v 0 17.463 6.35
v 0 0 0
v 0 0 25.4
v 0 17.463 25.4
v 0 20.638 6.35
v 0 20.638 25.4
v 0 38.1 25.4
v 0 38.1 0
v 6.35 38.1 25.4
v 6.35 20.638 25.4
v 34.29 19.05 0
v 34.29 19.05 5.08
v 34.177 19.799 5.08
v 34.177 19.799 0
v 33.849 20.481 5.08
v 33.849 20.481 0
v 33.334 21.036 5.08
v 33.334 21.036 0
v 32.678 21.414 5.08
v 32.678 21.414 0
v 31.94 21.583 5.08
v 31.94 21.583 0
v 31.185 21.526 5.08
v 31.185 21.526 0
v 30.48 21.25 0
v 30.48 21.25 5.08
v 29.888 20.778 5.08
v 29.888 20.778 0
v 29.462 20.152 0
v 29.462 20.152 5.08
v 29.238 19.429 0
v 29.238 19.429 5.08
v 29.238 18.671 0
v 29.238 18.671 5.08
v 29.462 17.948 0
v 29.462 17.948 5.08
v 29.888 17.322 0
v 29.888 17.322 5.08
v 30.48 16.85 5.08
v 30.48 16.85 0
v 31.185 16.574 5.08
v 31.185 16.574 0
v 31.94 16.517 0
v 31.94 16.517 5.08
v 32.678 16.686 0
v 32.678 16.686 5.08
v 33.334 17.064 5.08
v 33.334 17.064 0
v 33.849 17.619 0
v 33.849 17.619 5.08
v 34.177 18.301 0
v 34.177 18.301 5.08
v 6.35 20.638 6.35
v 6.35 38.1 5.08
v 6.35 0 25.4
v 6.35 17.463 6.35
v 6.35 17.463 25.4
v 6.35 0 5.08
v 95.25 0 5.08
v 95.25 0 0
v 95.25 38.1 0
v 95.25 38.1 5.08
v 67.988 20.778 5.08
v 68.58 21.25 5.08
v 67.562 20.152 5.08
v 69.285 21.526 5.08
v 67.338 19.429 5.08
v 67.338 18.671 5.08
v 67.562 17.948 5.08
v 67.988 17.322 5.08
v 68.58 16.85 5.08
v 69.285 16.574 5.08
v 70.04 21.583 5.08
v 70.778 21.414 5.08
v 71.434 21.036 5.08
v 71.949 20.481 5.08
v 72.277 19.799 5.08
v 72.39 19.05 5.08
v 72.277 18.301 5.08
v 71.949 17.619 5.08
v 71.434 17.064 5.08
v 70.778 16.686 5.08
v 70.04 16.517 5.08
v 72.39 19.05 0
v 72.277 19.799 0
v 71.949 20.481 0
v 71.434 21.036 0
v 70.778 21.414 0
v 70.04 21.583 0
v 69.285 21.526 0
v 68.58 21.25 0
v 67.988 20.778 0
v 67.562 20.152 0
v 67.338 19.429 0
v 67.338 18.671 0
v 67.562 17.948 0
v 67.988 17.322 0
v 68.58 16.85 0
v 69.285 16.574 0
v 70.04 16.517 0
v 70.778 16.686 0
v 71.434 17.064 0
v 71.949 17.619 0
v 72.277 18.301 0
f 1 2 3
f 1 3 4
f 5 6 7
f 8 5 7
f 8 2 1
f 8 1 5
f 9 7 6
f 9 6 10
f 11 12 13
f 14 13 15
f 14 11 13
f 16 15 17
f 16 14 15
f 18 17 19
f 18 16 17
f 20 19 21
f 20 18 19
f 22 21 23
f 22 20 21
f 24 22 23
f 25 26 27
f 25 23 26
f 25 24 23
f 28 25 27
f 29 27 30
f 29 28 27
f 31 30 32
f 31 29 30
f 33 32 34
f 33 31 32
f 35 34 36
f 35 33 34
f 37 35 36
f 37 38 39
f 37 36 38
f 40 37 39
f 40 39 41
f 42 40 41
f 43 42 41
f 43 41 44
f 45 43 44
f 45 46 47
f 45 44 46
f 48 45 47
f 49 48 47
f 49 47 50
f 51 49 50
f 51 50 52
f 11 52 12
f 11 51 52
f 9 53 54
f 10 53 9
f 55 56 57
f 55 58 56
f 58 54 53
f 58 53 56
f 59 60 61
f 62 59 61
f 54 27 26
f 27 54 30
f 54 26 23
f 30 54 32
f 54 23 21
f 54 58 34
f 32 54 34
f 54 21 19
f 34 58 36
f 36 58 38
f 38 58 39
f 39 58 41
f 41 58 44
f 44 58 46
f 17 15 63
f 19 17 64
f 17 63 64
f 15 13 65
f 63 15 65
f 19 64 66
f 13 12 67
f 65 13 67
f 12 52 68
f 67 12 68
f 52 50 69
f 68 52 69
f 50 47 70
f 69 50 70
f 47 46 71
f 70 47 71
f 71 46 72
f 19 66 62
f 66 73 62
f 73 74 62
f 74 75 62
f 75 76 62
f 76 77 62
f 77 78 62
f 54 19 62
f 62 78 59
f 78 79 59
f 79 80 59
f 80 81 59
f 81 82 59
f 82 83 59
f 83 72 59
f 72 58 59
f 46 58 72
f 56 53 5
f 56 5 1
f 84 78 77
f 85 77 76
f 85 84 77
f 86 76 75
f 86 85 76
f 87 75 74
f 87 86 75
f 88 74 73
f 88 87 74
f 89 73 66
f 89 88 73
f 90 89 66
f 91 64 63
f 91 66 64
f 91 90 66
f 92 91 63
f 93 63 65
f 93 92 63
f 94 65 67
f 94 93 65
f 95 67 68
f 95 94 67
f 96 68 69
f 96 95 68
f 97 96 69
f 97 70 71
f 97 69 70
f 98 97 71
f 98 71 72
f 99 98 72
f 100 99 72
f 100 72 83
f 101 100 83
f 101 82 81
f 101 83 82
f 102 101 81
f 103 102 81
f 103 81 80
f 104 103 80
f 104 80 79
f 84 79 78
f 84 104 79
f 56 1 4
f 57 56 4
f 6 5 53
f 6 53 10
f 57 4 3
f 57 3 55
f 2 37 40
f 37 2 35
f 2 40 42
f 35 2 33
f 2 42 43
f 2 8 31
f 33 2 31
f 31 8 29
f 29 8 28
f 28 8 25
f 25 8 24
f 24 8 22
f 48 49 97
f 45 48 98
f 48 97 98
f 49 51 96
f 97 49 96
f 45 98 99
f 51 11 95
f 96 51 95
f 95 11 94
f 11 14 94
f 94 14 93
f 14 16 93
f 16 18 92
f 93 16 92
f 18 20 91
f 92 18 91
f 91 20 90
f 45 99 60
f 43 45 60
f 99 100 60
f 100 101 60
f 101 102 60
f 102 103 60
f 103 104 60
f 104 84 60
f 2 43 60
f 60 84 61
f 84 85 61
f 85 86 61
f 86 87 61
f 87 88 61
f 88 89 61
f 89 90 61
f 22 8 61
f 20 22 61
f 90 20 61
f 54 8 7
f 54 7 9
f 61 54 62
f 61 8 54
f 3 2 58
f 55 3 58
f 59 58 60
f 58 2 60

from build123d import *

# Parameters (mm, degrees)
F0_W     = 95.25
F0_H     = 38.1
F0_R     = 2.54
F1_DEPTH = 25.4
F2_W     = 88.9
F2_H     = 20.32
F3_DEPTH = 38.101
F4_W     = 3.175
F4_H     = 19.05
F5_DEPTH = 25.4


with BuildPart() as f1:
    # F0 (on Top) → F1 (new body)
    with BuildSketch(Plane.XY):
        with Locations((47.625, 19.05)):
            Rectangle(F0_W, F0_H)
        with Locations((31.75, 19.05)):
            Circle(F0_R, mode=Mode.SUBTRACT)
        with Locations((69.85, 19.05)):
            Circle(F0_R, mode=Mode.SUBTRACT)
    extrude(amount=F1_DEPTH)

    # F2 (on face) → F3 (cut, through all)
    with BuildSketch(Plane.XZ):
        with Locations((50.8, 15.24)):
            Rectangle(F2_W, F2_H)
    extrude(amount=-F3_DEPTH, mode=Mode.SUBTRACT)

    # F4 (on face) → F5 (cut)
    with BuildSketch(Plane(origin=(0, 0, 0), x_dir=(0, -1, 0), z_dir=(-1, 0, 0))):
        with Locations((-19.05, 15.875)):
            Rectangle(F4_W, F4_H)
    extrude(amount=-F5_DEPTH, mode=Mode.SUBTRACT)


solid = f1.part
